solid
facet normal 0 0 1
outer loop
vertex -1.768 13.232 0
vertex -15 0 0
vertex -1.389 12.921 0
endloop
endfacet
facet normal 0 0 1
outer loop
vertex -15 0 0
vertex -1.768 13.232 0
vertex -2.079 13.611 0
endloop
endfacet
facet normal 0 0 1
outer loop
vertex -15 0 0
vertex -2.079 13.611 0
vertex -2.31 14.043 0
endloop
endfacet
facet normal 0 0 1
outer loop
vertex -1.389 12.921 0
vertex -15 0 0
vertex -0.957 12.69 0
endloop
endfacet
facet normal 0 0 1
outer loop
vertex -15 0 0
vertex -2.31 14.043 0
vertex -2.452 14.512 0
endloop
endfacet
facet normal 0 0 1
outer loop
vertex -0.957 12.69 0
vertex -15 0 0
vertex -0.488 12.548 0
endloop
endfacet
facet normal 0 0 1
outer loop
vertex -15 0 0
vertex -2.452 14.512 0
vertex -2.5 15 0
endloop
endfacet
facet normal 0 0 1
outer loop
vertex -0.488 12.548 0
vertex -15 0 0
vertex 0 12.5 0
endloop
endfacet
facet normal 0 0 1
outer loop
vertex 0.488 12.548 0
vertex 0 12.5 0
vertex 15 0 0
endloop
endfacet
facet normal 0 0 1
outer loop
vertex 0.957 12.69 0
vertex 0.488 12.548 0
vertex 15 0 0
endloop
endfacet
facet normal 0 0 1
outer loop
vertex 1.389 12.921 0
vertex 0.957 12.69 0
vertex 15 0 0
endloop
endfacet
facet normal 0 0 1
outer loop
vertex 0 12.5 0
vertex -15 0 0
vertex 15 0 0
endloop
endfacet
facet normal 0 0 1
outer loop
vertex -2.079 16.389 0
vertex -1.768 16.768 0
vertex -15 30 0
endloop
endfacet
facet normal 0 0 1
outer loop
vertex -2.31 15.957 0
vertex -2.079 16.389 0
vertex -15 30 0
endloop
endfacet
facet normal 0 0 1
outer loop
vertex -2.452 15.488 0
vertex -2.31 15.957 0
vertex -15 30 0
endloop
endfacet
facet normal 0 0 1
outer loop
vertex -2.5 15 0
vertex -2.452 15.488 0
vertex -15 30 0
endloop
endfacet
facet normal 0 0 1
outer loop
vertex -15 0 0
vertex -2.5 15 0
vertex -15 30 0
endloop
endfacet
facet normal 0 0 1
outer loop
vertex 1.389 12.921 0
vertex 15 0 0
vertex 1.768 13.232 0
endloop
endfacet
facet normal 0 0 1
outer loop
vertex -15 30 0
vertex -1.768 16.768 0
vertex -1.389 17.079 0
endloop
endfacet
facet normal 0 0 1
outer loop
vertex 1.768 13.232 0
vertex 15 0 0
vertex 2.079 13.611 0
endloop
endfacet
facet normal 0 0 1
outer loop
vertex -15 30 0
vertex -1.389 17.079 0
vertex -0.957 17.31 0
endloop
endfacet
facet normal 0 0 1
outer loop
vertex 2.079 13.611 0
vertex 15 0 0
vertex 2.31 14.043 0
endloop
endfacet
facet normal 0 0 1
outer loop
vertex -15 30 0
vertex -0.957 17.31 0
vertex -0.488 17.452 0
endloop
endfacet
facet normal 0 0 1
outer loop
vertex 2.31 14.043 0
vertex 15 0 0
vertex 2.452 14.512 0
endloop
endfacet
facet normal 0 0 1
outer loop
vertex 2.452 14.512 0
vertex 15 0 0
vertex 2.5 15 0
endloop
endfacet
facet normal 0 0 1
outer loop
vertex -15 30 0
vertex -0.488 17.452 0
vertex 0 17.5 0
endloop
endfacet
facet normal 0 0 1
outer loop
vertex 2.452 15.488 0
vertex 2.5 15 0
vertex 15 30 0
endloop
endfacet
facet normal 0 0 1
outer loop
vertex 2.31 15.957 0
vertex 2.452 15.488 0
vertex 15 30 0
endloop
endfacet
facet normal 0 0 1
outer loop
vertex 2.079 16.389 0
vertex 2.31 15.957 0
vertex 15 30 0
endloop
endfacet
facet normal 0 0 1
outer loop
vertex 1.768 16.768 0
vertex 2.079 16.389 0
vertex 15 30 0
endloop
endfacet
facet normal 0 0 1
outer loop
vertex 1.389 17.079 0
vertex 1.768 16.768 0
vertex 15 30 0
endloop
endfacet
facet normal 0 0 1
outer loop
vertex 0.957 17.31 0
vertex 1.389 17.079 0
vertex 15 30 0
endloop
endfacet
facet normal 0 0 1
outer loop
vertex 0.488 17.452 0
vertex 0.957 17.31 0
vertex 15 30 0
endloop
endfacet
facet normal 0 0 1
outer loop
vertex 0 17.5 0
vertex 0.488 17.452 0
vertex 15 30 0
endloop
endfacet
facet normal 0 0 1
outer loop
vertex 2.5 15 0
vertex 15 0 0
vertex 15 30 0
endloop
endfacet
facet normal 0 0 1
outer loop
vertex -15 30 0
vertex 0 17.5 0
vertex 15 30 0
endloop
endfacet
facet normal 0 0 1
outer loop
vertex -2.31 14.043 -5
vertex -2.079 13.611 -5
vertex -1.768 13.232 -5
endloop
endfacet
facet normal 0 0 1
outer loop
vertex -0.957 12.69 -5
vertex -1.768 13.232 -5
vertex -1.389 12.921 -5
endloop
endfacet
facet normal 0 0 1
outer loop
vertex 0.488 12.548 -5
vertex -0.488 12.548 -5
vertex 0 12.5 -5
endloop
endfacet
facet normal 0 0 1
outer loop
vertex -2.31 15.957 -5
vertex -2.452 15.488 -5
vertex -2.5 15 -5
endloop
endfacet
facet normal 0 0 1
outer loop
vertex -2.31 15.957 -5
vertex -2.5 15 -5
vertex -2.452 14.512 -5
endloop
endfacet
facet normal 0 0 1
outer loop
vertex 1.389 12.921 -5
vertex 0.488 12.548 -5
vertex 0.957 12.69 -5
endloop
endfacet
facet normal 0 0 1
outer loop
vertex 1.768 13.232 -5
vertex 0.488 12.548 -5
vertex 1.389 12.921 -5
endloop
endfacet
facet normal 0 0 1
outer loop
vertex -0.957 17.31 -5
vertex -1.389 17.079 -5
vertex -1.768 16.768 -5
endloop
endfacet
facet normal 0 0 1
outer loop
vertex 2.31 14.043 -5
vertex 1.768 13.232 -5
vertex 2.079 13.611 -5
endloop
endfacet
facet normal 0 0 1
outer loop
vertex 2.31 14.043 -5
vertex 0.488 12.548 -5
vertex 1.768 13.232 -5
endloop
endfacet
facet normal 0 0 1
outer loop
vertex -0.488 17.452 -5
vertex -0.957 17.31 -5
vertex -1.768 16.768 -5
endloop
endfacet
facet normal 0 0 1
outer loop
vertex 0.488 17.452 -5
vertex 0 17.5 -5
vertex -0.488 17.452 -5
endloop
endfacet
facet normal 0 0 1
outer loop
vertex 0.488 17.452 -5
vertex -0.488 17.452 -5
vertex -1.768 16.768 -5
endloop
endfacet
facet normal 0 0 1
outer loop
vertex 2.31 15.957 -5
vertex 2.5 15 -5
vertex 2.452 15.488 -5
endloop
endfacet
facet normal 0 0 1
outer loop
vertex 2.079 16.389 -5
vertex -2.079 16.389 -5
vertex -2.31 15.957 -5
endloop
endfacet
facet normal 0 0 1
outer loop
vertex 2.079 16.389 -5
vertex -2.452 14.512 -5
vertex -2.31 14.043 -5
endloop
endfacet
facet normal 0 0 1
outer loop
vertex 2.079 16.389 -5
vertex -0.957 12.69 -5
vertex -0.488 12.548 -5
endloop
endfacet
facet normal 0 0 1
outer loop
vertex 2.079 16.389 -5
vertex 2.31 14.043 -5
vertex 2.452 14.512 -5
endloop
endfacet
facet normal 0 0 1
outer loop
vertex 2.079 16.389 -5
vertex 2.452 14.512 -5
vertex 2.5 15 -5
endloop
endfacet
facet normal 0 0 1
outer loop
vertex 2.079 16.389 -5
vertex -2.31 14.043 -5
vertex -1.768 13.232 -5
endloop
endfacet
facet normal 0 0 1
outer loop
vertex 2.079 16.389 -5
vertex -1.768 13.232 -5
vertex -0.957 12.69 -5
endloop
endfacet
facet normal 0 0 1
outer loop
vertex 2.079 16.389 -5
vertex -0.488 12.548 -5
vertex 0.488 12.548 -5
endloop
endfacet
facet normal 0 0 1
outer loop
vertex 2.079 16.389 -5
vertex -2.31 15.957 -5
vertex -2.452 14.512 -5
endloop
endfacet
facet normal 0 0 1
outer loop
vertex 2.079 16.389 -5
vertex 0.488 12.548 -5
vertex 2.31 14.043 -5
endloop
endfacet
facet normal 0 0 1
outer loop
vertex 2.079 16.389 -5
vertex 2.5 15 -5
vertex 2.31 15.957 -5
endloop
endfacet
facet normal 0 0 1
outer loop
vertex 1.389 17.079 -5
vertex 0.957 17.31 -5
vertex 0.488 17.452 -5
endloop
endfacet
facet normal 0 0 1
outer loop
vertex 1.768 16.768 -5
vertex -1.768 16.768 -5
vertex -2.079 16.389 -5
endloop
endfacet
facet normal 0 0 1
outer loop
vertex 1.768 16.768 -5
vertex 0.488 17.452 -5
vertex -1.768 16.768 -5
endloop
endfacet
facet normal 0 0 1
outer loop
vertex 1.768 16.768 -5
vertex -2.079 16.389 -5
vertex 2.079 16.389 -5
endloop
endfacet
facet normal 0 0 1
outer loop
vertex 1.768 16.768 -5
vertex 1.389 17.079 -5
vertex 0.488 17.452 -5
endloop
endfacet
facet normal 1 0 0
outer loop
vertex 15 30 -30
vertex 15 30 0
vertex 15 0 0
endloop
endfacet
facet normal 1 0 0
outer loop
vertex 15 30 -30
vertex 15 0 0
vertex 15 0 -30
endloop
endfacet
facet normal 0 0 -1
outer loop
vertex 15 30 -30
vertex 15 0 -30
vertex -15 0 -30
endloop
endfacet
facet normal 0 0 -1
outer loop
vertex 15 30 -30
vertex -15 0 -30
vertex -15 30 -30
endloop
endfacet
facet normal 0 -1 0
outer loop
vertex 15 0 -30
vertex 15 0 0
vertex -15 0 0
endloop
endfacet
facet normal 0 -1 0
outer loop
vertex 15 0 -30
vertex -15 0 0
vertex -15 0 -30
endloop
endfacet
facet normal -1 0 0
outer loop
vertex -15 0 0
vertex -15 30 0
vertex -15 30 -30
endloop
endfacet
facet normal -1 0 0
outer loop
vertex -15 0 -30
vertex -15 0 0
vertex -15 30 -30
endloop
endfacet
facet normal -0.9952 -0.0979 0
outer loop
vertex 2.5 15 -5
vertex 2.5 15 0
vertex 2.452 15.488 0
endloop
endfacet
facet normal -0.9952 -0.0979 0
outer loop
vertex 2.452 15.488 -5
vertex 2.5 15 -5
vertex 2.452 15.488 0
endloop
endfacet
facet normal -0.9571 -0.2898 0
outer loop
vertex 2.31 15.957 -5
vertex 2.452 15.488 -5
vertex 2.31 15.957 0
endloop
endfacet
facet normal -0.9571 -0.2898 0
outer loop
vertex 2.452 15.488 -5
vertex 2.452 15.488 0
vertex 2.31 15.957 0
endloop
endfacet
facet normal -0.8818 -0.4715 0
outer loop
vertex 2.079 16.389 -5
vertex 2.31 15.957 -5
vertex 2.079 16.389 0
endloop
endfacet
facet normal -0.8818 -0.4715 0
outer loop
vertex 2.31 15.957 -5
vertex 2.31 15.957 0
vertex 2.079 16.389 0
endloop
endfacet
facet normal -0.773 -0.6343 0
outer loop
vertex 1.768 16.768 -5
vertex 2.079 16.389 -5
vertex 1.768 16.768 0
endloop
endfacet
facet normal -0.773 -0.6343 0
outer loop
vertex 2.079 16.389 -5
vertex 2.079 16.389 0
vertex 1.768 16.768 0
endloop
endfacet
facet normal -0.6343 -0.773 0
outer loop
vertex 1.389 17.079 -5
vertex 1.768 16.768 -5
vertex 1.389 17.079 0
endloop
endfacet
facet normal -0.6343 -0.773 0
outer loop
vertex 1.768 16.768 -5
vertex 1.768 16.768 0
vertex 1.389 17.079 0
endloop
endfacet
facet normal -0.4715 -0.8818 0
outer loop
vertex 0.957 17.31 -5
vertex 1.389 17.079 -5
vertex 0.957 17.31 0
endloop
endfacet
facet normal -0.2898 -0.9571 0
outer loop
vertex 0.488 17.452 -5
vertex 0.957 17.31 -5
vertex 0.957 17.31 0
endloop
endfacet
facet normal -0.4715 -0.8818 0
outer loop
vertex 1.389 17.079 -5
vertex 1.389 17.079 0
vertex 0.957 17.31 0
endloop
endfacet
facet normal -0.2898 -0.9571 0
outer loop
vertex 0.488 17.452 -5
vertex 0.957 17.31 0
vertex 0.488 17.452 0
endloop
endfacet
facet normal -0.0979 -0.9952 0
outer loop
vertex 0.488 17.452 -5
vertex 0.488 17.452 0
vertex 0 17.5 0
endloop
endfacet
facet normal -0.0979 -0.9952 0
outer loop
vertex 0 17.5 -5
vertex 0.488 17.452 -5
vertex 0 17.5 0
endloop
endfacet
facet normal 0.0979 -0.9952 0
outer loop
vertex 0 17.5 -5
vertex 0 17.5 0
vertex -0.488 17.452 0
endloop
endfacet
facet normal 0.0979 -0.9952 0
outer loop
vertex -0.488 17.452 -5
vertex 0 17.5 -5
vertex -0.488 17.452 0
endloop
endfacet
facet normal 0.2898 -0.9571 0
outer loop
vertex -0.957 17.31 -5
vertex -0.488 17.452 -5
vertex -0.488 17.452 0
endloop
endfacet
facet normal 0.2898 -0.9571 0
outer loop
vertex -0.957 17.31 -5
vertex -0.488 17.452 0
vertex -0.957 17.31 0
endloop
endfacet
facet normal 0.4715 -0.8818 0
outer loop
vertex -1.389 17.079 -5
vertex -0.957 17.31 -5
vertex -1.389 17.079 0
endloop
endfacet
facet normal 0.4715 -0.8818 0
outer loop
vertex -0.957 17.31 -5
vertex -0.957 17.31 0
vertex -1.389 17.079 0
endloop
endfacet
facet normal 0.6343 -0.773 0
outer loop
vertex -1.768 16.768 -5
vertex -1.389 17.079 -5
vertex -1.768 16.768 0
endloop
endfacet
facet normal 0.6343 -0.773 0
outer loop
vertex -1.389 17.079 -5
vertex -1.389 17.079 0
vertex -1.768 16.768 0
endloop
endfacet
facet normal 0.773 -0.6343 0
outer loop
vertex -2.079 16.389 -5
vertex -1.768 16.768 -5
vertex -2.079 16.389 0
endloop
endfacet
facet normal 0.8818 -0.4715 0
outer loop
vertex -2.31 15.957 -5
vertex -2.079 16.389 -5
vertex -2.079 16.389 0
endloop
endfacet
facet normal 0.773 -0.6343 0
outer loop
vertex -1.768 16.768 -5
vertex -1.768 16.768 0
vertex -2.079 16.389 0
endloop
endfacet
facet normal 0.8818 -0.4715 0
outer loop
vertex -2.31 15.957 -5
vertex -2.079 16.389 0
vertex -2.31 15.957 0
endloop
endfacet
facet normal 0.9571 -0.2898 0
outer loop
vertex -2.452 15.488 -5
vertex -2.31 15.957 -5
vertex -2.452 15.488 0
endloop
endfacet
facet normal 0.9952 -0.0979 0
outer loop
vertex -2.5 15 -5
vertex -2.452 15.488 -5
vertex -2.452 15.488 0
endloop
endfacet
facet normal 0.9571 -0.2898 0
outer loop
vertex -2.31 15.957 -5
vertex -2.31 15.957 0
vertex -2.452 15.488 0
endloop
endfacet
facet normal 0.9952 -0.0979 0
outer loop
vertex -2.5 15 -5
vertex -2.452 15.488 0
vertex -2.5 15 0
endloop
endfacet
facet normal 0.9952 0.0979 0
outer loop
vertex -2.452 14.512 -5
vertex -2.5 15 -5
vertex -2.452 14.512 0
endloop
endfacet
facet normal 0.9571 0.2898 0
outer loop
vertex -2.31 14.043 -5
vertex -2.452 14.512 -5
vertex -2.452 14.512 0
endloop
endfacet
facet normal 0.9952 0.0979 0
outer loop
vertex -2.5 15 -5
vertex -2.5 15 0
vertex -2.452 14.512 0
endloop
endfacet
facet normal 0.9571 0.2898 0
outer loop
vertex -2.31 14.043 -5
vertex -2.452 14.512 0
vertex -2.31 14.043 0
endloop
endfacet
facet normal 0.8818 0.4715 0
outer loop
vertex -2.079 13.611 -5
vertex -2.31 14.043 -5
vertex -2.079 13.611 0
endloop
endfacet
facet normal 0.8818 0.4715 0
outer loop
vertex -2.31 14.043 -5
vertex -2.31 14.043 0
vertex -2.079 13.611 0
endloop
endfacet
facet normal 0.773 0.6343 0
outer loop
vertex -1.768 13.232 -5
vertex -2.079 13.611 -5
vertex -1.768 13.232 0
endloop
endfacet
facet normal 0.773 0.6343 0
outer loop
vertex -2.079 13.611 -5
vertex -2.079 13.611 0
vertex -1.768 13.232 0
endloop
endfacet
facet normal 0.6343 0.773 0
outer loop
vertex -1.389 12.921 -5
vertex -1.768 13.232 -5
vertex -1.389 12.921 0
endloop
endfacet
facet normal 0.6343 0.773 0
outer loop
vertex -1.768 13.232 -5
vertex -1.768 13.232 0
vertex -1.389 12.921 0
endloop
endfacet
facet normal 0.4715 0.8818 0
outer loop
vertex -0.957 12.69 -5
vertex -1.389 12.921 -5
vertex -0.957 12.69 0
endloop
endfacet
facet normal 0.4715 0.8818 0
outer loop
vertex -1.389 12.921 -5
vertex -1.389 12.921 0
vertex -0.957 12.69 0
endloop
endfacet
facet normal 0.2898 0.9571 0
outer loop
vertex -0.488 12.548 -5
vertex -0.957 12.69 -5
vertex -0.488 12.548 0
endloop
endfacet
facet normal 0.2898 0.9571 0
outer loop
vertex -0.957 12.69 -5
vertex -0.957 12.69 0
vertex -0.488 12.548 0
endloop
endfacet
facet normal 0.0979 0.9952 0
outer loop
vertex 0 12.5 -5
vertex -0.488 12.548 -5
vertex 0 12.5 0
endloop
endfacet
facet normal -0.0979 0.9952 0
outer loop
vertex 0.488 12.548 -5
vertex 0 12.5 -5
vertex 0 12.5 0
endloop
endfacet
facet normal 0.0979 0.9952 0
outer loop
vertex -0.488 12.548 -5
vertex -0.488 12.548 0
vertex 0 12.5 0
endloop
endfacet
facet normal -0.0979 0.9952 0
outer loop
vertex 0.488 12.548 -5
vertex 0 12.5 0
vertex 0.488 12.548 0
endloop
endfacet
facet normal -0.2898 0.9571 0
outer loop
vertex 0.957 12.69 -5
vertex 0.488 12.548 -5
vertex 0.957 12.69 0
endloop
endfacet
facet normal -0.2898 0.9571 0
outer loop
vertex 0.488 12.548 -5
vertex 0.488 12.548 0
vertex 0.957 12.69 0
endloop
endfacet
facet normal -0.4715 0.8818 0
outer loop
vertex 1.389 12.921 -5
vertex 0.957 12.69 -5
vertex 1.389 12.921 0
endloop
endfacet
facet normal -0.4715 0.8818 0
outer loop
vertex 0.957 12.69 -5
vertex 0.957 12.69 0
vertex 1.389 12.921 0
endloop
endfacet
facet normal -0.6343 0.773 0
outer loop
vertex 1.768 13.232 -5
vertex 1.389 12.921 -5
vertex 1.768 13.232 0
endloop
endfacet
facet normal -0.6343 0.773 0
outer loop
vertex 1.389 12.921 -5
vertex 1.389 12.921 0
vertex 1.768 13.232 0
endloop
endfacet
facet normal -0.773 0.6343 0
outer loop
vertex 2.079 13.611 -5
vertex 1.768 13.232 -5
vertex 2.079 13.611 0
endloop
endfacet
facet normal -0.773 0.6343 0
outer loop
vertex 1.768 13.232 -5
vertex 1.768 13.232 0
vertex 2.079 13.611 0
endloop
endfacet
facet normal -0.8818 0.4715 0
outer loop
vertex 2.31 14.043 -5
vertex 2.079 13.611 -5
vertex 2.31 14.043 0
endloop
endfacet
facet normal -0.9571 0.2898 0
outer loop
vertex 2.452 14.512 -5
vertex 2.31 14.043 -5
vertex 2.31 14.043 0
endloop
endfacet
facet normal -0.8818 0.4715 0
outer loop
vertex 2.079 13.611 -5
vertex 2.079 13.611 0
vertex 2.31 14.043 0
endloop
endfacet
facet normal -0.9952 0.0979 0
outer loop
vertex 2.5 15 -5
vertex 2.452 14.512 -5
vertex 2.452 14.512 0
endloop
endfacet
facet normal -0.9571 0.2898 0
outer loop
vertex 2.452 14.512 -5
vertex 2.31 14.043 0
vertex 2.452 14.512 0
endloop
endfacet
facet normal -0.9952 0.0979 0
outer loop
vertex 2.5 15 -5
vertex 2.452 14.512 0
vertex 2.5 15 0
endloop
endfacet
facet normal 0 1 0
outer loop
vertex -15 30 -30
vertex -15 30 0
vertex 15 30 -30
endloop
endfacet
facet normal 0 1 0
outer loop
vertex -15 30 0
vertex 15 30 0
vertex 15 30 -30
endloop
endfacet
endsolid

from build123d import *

# Parameters (mm, degrees)
SKETCH2_W           = 30
SKETCH2_H           = 30
BOSS_EXTRUDE1_DEPTH = 15
SKETCH3_R           = 2.5
CUT_EXTRUDE1_DEPTH  = 5


with BuildPart() as part:
    # Sketch2 → Boss-Extrude1 (new body, symmetric)
    with BuildSketch(Plane(origin=(0, 0, 0), x_dir=(0, 0, -1), z_dir=(1, 0, 0))):
        with Locations((15, 15)):
            Rectangle(SKETCH2_W, SKETCH2_H)
    extrude(amount=BOSS_EXTRUDE1_DEPTH, both=True)

    # Sketch3 → Cut-Extrude1 (cut, symmetric)
    with BuildSketch(Plane.XY):
        with Locations((0, 15)):
            Circle(SKETCH3_R)
    extrude(amount=CUT_EXTRUDE1_DEPTH, both=True, mode=Mode.SUBTRACT)


solid = part.part
